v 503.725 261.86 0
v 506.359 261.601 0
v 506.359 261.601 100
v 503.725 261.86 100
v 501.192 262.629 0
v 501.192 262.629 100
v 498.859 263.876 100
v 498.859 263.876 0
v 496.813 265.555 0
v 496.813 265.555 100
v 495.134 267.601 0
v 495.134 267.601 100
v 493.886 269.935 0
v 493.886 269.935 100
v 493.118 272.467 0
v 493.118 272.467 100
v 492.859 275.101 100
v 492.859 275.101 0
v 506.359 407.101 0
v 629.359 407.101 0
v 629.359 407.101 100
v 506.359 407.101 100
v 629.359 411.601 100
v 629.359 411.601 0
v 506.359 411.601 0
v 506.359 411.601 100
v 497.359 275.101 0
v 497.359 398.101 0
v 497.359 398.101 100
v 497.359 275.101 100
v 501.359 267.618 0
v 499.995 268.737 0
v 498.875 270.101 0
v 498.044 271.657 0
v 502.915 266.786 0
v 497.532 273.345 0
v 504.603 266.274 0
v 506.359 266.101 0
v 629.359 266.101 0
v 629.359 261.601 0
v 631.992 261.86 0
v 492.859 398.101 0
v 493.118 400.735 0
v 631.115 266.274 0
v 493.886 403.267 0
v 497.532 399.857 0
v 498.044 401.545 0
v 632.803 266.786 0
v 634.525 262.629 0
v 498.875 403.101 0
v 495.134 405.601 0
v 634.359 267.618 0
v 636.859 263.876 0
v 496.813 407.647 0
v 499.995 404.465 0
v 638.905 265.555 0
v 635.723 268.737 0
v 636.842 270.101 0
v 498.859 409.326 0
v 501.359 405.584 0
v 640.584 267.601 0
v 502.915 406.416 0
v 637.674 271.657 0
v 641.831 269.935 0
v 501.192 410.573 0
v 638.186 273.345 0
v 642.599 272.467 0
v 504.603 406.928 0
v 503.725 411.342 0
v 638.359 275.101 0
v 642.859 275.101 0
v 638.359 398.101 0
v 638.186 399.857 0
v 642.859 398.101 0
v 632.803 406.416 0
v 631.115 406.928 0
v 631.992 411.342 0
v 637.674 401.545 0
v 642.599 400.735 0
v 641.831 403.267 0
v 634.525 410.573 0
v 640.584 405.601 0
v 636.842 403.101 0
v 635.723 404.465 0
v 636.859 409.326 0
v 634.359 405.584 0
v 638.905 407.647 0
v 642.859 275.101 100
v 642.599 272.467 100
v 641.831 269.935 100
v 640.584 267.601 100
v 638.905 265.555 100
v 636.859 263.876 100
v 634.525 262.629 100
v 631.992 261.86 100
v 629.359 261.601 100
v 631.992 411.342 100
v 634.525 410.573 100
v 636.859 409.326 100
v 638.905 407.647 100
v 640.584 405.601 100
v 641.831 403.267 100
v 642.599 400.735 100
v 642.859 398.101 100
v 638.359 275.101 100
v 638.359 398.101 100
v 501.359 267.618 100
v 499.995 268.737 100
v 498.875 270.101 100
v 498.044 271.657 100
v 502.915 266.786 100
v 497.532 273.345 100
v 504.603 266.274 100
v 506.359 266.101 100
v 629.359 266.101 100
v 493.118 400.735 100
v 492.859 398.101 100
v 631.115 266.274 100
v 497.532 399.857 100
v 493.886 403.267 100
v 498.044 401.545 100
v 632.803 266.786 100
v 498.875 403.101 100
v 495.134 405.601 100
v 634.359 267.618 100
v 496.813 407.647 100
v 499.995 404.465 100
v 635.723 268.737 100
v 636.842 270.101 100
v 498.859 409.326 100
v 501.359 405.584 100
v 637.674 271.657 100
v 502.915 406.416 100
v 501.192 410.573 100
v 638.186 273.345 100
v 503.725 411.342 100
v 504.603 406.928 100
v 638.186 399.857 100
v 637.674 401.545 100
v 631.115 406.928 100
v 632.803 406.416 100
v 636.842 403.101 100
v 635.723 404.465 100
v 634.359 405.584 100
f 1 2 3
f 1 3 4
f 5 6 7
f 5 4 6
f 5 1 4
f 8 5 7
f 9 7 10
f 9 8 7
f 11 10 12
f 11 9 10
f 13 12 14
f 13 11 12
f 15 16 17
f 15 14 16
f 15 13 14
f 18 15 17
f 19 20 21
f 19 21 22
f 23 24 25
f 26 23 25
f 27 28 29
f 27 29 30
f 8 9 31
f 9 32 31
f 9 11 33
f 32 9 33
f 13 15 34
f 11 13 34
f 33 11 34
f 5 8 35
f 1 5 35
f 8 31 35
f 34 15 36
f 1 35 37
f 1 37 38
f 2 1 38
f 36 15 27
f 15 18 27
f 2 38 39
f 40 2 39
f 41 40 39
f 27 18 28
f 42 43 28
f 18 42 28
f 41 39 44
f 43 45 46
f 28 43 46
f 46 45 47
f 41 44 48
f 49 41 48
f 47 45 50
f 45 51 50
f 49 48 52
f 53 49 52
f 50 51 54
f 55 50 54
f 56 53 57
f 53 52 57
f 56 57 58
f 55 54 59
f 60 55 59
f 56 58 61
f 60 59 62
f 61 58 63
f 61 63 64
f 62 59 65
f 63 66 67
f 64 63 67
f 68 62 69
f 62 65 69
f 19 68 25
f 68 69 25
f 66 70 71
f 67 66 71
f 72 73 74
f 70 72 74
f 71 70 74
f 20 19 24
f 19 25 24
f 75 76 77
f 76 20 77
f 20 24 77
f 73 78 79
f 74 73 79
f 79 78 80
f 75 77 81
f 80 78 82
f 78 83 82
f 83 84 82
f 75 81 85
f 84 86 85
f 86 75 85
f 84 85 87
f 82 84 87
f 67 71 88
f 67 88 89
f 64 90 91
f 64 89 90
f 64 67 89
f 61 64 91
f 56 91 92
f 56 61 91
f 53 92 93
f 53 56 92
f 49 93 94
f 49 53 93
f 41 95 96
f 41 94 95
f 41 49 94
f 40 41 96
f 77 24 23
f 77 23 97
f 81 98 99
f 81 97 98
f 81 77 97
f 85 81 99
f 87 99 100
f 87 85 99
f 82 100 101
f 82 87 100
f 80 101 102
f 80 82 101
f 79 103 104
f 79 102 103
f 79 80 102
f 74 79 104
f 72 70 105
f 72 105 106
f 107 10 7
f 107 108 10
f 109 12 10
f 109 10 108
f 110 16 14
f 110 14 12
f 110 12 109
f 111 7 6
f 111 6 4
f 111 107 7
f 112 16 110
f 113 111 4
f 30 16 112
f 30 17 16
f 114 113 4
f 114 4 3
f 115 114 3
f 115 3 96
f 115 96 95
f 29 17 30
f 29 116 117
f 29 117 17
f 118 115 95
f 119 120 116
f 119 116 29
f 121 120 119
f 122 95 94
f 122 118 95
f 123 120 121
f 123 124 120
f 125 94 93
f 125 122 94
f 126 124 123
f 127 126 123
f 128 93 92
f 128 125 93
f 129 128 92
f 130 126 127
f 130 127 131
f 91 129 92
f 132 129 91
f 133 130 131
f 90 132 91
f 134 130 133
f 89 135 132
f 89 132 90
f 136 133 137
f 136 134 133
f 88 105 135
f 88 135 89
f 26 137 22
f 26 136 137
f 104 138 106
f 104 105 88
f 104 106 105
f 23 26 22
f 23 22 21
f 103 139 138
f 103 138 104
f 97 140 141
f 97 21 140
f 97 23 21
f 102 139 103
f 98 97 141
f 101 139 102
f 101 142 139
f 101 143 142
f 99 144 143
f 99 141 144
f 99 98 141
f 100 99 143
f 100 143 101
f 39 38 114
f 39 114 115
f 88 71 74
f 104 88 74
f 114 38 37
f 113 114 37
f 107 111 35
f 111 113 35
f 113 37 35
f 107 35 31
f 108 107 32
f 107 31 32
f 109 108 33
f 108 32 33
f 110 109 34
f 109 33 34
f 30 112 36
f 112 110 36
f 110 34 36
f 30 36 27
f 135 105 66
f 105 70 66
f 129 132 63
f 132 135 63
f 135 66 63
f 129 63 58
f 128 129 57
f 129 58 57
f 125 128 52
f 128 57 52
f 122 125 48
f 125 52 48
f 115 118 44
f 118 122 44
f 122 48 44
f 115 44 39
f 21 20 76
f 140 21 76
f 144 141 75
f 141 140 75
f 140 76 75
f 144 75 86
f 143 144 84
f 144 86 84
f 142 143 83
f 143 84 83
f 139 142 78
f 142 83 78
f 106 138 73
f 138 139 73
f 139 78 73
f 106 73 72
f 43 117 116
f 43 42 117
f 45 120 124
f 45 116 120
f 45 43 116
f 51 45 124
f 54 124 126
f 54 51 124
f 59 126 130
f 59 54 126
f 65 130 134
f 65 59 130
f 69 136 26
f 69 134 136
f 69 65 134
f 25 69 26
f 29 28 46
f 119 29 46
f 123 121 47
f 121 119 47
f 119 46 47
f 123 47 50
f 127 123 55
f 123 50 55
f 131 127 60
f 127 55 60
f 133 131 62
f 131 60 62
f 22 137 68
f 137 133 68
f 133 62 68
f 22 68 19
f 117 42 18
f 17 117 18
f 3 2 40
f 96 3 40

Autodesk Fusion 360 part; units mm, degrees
sketch "スケッチ1" plane through (0, 0, 0) normal (0, 0, 1) x (1, 0, 0)
  arc A0 (506.3587, 411.6011) -> (492.8587, 398.1011) centre (506.3587, 398.1011) ccw
  arc A1 (506.3587, 407.1011) -> (497.3587, 398.1011) centre (506.3587, 398.1011) ccw
  arc A2 (642.8587, 398.1011) -> (629.3587, 411.6011) centre (629.3587, 398.1011) ccw
  arc A3 (638.3587, 398.1011) -> (629.3587, 407.1011) centre (629.3587, 398.1011) ccw
  line L0 (506.3587, 261.6011) -> (629.3587, 261.6011)
  line L1 (506.3587, 266.1011) -> (629.3587, 266.1011)
  arc A4 (492.8587, 275.1011) -> (506.3587, 261.6011) centre (506.3587, 275.1011) ccw
  arc A5 (497.3587, 275.1011) -> (506.3587, 266.1011) centre (506.3587, 275.1011) ccw
  line L2 (492.8587, 398.1011) -> (492.8587, 275.1011)
  line L3 (497.3587, 398.1011) -> (497.3587, 275.1011)
  arc A6 (629.3587, 261.6011) -> (642.8587, 275.1011) centre (629.3587, 275.1011) ccw
  arc A7 (629.3587, 266.1011) -> (638.3587, 275.1011) centre (629.3587, 275.1011) ccw
  line L4 (638.3587, 275.1011) -> (638.3587, 398.1011)
  line L5 (642.8587, 275.1011) -> (642.8587, 398.1011)
  line L6 (629.3587, 411.6011) -> (506.3587, 411.6011)
  line L7 (629.3587, 407.1011) -> (506.3587, 407.1011)
  point P0 (567.8587, 336.6011)
extrude "押し出し1" add sketch "スケッチ1" along normal blind 100
